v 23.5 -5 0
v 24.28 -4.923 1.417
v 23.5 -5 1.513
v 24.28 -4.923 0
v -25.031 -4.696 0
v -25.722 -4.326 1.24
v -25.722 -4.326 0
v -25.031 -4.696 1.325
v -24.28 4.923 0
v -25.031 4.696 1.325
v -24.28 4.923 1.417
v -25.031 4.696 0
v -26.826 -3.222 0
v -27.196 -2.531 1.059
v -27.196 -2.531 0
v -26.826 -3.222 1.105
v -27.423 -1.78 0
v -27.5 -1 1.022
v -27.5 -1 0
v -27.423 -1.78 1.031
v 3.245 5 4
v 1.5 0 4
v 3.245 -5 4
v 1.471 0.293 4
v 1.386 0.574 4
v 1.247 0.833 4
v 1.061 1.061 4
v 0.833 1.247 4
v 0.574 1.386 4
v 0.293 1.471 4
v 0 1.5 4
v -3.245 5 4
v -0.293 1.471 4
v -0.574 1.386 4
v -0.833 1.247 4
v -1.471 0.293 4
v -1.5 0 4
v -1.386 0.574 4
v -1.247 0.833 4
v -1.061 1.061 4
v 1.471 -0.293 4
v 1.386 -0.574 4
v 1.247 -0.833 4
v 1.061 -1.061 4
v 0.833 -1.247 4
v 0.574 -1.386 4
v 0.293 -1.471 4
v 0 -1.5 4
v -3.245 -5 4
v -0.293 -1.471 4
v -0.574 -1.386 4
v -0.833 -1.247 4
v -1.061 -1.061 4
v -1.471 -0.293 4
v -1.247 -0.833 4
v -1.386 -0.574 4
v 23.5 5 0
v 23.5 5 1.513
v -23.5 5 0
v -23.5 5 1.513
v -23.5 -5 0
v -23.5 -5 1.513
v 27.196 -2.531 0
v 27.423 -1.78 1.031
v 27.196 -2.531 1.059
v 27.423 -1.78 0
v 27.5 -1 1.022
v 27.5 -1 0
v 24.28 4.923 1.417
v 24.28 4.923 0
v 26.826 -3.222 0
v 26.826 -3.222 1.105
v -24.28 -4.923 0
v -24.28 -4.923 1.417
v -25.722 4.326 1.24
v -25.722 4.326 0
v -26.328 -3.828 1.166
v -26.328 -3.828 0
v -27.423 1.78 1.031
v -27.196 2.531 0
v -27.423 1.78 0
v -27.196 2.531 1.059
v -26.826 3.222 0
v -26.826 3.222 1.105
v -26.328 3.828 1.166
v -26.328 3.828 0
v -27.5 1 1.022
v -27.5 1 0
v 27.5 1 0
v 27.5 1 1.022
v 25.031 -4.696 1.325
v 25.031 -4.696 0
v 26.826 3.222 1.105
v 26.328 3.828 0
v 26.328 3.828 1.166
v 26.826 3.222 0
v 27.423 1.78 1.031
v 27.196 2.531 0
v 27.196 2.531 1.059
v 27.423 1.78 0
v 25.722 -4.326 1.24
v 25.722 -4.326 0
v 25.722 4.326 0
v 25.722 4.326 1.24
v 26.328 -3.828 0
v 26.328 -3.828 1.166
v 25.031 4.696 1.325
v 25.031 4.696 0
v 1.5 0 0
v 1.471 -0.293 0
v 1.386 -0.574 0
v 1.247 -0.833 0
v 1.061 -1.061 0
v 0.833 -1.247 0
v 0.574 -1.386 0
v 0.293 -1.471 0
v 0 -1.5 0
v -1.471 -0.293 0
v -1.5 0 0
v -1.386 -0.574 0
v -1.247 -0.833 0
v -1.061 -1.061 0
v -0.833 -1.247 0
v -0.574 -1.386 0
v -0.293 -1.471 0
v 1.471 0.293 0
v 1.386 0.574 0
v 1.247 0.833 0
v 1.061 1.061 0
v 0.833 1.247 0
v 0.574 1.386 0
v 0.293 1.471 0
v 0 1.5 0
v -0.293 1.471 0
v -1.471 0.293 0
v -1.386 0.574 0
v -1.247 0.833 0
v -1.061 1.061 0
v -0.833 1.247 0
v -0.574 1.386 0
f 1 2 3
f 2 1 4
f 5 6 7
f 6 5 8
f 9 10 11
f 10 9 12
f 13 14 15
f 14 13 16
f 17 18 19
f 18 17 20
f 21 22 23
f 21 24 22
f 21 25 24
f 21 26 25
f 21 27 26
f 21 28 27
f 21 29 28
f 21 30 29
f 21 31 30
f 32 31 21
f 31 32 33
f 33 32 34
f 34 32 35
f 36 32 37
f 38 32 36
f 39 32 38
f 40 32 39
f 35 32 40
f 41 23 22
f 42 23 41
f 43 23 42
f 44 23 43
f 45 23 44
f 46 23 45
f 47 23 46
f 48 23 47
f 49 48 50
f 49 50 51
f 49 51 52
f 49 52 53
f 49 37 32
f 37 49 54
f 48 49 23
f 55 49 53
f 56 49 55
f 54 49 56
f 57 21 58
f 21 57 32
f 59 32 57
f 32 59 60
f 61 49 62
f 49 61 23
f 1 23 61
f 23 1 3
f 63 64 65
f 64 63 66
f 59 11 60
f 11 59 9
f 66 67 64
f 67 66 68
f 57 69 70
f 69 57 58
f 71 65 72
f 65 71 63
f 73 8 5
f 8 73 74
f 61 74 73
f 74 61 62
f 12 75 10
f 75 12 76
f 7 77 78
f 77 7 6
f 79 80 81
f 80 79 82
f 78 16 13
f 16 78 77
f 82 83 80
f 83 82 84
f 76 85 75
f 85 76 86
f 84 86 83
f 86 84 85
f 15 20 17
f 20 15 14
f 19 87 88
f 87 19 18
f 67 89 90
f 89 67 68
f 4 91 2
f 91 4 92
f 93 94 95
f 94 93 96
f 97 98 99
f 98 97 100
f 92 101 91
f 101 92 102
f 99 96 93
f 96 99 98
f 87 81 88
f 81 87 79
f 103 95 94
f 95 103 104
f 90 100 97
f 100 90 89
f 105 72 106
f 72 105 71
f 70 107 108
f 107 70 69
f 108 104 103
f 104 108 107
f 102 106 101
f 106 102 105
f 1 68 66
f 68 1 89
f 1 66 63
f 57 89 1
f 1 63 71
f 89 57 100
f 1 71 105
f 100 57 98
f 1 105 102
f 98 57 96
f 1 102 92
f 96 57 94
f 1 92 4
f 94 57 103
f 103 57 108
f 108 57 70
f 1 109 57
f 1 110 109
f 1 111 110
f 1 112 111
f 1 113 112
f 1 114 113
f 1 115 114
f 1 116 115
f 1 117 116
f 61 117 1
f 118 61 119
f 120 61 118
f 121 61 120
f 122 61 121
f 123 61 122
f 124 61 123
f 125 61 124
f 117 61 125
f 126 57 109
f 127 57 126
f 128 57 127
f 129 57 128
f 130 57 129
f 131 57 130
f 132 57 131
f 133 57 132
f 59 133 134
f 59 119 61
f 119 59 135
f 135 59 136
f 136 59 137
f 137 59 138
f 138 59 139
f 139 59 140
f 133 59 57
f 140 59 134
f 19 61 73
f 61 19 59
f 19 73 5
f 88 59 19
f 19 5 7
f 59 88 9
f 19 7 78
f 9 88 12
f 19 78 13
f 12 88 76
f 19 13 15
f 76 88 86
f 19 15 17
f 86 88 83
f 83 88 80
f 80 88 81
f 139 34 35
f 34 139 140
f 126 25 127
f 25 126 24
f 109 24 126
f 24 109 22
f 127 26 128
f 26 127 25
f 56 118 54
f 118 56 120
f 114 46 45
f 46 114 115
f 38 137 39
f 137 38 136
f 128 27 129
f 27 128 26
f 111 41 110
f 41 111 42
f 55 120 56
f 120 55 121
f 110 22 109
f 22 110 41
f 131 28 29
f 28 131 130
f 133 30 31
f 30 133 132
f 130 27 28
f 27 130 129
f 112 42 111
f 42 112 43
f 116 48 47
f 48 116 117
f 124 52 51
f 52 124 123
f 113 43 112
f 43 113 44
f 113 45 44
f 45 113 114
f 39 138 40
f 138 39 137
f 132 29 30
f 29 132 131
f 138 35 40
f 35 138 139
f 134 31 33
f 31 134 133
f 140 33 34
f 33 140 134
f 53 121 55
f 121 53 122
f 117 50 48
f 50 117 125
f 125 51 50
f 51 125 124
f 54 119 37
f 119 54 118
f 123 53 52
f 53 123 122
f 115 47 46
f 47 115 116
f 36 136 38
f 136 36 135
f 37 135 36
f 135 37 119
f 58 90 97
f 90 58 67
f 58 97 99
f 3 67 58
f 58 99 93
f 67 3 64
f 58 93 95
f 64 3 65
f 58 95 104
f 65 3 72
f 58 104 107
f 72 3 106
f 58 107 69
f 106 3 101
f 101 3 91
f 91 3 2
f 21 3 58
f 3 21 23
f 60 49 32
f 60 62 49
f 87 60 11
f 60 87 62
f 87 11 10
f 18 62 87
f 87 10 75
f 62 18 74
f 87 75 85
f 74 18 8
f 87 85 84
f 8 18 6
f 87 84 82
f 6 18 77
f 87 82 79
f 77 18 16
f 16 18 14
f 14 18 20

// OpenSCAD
// Stick to go behind drywall (holds patch)

$fn = 32;

screw_d = 3.0;
stick_thick = 4.0;
stick_len = 55;
stick_wid = 10;
rounding = 4;

difference() {
    linear_extrude(stick_thick)
    offset(rounding) offset(-rounding)
    square([stick_len, stick_wid], center=true);
    cylinder(h=stick_thick, d=screw_d);
    translate([3,0,0])
    #rotate([0,7,0])
    translate([0,0,9])
    cube([100, 100, 10], center=true);
    translate([-3,0,0])
    #rotate([0,-7,0])
    translate([0,0,9])
    cube([100, 100, 10], center=true);
}
